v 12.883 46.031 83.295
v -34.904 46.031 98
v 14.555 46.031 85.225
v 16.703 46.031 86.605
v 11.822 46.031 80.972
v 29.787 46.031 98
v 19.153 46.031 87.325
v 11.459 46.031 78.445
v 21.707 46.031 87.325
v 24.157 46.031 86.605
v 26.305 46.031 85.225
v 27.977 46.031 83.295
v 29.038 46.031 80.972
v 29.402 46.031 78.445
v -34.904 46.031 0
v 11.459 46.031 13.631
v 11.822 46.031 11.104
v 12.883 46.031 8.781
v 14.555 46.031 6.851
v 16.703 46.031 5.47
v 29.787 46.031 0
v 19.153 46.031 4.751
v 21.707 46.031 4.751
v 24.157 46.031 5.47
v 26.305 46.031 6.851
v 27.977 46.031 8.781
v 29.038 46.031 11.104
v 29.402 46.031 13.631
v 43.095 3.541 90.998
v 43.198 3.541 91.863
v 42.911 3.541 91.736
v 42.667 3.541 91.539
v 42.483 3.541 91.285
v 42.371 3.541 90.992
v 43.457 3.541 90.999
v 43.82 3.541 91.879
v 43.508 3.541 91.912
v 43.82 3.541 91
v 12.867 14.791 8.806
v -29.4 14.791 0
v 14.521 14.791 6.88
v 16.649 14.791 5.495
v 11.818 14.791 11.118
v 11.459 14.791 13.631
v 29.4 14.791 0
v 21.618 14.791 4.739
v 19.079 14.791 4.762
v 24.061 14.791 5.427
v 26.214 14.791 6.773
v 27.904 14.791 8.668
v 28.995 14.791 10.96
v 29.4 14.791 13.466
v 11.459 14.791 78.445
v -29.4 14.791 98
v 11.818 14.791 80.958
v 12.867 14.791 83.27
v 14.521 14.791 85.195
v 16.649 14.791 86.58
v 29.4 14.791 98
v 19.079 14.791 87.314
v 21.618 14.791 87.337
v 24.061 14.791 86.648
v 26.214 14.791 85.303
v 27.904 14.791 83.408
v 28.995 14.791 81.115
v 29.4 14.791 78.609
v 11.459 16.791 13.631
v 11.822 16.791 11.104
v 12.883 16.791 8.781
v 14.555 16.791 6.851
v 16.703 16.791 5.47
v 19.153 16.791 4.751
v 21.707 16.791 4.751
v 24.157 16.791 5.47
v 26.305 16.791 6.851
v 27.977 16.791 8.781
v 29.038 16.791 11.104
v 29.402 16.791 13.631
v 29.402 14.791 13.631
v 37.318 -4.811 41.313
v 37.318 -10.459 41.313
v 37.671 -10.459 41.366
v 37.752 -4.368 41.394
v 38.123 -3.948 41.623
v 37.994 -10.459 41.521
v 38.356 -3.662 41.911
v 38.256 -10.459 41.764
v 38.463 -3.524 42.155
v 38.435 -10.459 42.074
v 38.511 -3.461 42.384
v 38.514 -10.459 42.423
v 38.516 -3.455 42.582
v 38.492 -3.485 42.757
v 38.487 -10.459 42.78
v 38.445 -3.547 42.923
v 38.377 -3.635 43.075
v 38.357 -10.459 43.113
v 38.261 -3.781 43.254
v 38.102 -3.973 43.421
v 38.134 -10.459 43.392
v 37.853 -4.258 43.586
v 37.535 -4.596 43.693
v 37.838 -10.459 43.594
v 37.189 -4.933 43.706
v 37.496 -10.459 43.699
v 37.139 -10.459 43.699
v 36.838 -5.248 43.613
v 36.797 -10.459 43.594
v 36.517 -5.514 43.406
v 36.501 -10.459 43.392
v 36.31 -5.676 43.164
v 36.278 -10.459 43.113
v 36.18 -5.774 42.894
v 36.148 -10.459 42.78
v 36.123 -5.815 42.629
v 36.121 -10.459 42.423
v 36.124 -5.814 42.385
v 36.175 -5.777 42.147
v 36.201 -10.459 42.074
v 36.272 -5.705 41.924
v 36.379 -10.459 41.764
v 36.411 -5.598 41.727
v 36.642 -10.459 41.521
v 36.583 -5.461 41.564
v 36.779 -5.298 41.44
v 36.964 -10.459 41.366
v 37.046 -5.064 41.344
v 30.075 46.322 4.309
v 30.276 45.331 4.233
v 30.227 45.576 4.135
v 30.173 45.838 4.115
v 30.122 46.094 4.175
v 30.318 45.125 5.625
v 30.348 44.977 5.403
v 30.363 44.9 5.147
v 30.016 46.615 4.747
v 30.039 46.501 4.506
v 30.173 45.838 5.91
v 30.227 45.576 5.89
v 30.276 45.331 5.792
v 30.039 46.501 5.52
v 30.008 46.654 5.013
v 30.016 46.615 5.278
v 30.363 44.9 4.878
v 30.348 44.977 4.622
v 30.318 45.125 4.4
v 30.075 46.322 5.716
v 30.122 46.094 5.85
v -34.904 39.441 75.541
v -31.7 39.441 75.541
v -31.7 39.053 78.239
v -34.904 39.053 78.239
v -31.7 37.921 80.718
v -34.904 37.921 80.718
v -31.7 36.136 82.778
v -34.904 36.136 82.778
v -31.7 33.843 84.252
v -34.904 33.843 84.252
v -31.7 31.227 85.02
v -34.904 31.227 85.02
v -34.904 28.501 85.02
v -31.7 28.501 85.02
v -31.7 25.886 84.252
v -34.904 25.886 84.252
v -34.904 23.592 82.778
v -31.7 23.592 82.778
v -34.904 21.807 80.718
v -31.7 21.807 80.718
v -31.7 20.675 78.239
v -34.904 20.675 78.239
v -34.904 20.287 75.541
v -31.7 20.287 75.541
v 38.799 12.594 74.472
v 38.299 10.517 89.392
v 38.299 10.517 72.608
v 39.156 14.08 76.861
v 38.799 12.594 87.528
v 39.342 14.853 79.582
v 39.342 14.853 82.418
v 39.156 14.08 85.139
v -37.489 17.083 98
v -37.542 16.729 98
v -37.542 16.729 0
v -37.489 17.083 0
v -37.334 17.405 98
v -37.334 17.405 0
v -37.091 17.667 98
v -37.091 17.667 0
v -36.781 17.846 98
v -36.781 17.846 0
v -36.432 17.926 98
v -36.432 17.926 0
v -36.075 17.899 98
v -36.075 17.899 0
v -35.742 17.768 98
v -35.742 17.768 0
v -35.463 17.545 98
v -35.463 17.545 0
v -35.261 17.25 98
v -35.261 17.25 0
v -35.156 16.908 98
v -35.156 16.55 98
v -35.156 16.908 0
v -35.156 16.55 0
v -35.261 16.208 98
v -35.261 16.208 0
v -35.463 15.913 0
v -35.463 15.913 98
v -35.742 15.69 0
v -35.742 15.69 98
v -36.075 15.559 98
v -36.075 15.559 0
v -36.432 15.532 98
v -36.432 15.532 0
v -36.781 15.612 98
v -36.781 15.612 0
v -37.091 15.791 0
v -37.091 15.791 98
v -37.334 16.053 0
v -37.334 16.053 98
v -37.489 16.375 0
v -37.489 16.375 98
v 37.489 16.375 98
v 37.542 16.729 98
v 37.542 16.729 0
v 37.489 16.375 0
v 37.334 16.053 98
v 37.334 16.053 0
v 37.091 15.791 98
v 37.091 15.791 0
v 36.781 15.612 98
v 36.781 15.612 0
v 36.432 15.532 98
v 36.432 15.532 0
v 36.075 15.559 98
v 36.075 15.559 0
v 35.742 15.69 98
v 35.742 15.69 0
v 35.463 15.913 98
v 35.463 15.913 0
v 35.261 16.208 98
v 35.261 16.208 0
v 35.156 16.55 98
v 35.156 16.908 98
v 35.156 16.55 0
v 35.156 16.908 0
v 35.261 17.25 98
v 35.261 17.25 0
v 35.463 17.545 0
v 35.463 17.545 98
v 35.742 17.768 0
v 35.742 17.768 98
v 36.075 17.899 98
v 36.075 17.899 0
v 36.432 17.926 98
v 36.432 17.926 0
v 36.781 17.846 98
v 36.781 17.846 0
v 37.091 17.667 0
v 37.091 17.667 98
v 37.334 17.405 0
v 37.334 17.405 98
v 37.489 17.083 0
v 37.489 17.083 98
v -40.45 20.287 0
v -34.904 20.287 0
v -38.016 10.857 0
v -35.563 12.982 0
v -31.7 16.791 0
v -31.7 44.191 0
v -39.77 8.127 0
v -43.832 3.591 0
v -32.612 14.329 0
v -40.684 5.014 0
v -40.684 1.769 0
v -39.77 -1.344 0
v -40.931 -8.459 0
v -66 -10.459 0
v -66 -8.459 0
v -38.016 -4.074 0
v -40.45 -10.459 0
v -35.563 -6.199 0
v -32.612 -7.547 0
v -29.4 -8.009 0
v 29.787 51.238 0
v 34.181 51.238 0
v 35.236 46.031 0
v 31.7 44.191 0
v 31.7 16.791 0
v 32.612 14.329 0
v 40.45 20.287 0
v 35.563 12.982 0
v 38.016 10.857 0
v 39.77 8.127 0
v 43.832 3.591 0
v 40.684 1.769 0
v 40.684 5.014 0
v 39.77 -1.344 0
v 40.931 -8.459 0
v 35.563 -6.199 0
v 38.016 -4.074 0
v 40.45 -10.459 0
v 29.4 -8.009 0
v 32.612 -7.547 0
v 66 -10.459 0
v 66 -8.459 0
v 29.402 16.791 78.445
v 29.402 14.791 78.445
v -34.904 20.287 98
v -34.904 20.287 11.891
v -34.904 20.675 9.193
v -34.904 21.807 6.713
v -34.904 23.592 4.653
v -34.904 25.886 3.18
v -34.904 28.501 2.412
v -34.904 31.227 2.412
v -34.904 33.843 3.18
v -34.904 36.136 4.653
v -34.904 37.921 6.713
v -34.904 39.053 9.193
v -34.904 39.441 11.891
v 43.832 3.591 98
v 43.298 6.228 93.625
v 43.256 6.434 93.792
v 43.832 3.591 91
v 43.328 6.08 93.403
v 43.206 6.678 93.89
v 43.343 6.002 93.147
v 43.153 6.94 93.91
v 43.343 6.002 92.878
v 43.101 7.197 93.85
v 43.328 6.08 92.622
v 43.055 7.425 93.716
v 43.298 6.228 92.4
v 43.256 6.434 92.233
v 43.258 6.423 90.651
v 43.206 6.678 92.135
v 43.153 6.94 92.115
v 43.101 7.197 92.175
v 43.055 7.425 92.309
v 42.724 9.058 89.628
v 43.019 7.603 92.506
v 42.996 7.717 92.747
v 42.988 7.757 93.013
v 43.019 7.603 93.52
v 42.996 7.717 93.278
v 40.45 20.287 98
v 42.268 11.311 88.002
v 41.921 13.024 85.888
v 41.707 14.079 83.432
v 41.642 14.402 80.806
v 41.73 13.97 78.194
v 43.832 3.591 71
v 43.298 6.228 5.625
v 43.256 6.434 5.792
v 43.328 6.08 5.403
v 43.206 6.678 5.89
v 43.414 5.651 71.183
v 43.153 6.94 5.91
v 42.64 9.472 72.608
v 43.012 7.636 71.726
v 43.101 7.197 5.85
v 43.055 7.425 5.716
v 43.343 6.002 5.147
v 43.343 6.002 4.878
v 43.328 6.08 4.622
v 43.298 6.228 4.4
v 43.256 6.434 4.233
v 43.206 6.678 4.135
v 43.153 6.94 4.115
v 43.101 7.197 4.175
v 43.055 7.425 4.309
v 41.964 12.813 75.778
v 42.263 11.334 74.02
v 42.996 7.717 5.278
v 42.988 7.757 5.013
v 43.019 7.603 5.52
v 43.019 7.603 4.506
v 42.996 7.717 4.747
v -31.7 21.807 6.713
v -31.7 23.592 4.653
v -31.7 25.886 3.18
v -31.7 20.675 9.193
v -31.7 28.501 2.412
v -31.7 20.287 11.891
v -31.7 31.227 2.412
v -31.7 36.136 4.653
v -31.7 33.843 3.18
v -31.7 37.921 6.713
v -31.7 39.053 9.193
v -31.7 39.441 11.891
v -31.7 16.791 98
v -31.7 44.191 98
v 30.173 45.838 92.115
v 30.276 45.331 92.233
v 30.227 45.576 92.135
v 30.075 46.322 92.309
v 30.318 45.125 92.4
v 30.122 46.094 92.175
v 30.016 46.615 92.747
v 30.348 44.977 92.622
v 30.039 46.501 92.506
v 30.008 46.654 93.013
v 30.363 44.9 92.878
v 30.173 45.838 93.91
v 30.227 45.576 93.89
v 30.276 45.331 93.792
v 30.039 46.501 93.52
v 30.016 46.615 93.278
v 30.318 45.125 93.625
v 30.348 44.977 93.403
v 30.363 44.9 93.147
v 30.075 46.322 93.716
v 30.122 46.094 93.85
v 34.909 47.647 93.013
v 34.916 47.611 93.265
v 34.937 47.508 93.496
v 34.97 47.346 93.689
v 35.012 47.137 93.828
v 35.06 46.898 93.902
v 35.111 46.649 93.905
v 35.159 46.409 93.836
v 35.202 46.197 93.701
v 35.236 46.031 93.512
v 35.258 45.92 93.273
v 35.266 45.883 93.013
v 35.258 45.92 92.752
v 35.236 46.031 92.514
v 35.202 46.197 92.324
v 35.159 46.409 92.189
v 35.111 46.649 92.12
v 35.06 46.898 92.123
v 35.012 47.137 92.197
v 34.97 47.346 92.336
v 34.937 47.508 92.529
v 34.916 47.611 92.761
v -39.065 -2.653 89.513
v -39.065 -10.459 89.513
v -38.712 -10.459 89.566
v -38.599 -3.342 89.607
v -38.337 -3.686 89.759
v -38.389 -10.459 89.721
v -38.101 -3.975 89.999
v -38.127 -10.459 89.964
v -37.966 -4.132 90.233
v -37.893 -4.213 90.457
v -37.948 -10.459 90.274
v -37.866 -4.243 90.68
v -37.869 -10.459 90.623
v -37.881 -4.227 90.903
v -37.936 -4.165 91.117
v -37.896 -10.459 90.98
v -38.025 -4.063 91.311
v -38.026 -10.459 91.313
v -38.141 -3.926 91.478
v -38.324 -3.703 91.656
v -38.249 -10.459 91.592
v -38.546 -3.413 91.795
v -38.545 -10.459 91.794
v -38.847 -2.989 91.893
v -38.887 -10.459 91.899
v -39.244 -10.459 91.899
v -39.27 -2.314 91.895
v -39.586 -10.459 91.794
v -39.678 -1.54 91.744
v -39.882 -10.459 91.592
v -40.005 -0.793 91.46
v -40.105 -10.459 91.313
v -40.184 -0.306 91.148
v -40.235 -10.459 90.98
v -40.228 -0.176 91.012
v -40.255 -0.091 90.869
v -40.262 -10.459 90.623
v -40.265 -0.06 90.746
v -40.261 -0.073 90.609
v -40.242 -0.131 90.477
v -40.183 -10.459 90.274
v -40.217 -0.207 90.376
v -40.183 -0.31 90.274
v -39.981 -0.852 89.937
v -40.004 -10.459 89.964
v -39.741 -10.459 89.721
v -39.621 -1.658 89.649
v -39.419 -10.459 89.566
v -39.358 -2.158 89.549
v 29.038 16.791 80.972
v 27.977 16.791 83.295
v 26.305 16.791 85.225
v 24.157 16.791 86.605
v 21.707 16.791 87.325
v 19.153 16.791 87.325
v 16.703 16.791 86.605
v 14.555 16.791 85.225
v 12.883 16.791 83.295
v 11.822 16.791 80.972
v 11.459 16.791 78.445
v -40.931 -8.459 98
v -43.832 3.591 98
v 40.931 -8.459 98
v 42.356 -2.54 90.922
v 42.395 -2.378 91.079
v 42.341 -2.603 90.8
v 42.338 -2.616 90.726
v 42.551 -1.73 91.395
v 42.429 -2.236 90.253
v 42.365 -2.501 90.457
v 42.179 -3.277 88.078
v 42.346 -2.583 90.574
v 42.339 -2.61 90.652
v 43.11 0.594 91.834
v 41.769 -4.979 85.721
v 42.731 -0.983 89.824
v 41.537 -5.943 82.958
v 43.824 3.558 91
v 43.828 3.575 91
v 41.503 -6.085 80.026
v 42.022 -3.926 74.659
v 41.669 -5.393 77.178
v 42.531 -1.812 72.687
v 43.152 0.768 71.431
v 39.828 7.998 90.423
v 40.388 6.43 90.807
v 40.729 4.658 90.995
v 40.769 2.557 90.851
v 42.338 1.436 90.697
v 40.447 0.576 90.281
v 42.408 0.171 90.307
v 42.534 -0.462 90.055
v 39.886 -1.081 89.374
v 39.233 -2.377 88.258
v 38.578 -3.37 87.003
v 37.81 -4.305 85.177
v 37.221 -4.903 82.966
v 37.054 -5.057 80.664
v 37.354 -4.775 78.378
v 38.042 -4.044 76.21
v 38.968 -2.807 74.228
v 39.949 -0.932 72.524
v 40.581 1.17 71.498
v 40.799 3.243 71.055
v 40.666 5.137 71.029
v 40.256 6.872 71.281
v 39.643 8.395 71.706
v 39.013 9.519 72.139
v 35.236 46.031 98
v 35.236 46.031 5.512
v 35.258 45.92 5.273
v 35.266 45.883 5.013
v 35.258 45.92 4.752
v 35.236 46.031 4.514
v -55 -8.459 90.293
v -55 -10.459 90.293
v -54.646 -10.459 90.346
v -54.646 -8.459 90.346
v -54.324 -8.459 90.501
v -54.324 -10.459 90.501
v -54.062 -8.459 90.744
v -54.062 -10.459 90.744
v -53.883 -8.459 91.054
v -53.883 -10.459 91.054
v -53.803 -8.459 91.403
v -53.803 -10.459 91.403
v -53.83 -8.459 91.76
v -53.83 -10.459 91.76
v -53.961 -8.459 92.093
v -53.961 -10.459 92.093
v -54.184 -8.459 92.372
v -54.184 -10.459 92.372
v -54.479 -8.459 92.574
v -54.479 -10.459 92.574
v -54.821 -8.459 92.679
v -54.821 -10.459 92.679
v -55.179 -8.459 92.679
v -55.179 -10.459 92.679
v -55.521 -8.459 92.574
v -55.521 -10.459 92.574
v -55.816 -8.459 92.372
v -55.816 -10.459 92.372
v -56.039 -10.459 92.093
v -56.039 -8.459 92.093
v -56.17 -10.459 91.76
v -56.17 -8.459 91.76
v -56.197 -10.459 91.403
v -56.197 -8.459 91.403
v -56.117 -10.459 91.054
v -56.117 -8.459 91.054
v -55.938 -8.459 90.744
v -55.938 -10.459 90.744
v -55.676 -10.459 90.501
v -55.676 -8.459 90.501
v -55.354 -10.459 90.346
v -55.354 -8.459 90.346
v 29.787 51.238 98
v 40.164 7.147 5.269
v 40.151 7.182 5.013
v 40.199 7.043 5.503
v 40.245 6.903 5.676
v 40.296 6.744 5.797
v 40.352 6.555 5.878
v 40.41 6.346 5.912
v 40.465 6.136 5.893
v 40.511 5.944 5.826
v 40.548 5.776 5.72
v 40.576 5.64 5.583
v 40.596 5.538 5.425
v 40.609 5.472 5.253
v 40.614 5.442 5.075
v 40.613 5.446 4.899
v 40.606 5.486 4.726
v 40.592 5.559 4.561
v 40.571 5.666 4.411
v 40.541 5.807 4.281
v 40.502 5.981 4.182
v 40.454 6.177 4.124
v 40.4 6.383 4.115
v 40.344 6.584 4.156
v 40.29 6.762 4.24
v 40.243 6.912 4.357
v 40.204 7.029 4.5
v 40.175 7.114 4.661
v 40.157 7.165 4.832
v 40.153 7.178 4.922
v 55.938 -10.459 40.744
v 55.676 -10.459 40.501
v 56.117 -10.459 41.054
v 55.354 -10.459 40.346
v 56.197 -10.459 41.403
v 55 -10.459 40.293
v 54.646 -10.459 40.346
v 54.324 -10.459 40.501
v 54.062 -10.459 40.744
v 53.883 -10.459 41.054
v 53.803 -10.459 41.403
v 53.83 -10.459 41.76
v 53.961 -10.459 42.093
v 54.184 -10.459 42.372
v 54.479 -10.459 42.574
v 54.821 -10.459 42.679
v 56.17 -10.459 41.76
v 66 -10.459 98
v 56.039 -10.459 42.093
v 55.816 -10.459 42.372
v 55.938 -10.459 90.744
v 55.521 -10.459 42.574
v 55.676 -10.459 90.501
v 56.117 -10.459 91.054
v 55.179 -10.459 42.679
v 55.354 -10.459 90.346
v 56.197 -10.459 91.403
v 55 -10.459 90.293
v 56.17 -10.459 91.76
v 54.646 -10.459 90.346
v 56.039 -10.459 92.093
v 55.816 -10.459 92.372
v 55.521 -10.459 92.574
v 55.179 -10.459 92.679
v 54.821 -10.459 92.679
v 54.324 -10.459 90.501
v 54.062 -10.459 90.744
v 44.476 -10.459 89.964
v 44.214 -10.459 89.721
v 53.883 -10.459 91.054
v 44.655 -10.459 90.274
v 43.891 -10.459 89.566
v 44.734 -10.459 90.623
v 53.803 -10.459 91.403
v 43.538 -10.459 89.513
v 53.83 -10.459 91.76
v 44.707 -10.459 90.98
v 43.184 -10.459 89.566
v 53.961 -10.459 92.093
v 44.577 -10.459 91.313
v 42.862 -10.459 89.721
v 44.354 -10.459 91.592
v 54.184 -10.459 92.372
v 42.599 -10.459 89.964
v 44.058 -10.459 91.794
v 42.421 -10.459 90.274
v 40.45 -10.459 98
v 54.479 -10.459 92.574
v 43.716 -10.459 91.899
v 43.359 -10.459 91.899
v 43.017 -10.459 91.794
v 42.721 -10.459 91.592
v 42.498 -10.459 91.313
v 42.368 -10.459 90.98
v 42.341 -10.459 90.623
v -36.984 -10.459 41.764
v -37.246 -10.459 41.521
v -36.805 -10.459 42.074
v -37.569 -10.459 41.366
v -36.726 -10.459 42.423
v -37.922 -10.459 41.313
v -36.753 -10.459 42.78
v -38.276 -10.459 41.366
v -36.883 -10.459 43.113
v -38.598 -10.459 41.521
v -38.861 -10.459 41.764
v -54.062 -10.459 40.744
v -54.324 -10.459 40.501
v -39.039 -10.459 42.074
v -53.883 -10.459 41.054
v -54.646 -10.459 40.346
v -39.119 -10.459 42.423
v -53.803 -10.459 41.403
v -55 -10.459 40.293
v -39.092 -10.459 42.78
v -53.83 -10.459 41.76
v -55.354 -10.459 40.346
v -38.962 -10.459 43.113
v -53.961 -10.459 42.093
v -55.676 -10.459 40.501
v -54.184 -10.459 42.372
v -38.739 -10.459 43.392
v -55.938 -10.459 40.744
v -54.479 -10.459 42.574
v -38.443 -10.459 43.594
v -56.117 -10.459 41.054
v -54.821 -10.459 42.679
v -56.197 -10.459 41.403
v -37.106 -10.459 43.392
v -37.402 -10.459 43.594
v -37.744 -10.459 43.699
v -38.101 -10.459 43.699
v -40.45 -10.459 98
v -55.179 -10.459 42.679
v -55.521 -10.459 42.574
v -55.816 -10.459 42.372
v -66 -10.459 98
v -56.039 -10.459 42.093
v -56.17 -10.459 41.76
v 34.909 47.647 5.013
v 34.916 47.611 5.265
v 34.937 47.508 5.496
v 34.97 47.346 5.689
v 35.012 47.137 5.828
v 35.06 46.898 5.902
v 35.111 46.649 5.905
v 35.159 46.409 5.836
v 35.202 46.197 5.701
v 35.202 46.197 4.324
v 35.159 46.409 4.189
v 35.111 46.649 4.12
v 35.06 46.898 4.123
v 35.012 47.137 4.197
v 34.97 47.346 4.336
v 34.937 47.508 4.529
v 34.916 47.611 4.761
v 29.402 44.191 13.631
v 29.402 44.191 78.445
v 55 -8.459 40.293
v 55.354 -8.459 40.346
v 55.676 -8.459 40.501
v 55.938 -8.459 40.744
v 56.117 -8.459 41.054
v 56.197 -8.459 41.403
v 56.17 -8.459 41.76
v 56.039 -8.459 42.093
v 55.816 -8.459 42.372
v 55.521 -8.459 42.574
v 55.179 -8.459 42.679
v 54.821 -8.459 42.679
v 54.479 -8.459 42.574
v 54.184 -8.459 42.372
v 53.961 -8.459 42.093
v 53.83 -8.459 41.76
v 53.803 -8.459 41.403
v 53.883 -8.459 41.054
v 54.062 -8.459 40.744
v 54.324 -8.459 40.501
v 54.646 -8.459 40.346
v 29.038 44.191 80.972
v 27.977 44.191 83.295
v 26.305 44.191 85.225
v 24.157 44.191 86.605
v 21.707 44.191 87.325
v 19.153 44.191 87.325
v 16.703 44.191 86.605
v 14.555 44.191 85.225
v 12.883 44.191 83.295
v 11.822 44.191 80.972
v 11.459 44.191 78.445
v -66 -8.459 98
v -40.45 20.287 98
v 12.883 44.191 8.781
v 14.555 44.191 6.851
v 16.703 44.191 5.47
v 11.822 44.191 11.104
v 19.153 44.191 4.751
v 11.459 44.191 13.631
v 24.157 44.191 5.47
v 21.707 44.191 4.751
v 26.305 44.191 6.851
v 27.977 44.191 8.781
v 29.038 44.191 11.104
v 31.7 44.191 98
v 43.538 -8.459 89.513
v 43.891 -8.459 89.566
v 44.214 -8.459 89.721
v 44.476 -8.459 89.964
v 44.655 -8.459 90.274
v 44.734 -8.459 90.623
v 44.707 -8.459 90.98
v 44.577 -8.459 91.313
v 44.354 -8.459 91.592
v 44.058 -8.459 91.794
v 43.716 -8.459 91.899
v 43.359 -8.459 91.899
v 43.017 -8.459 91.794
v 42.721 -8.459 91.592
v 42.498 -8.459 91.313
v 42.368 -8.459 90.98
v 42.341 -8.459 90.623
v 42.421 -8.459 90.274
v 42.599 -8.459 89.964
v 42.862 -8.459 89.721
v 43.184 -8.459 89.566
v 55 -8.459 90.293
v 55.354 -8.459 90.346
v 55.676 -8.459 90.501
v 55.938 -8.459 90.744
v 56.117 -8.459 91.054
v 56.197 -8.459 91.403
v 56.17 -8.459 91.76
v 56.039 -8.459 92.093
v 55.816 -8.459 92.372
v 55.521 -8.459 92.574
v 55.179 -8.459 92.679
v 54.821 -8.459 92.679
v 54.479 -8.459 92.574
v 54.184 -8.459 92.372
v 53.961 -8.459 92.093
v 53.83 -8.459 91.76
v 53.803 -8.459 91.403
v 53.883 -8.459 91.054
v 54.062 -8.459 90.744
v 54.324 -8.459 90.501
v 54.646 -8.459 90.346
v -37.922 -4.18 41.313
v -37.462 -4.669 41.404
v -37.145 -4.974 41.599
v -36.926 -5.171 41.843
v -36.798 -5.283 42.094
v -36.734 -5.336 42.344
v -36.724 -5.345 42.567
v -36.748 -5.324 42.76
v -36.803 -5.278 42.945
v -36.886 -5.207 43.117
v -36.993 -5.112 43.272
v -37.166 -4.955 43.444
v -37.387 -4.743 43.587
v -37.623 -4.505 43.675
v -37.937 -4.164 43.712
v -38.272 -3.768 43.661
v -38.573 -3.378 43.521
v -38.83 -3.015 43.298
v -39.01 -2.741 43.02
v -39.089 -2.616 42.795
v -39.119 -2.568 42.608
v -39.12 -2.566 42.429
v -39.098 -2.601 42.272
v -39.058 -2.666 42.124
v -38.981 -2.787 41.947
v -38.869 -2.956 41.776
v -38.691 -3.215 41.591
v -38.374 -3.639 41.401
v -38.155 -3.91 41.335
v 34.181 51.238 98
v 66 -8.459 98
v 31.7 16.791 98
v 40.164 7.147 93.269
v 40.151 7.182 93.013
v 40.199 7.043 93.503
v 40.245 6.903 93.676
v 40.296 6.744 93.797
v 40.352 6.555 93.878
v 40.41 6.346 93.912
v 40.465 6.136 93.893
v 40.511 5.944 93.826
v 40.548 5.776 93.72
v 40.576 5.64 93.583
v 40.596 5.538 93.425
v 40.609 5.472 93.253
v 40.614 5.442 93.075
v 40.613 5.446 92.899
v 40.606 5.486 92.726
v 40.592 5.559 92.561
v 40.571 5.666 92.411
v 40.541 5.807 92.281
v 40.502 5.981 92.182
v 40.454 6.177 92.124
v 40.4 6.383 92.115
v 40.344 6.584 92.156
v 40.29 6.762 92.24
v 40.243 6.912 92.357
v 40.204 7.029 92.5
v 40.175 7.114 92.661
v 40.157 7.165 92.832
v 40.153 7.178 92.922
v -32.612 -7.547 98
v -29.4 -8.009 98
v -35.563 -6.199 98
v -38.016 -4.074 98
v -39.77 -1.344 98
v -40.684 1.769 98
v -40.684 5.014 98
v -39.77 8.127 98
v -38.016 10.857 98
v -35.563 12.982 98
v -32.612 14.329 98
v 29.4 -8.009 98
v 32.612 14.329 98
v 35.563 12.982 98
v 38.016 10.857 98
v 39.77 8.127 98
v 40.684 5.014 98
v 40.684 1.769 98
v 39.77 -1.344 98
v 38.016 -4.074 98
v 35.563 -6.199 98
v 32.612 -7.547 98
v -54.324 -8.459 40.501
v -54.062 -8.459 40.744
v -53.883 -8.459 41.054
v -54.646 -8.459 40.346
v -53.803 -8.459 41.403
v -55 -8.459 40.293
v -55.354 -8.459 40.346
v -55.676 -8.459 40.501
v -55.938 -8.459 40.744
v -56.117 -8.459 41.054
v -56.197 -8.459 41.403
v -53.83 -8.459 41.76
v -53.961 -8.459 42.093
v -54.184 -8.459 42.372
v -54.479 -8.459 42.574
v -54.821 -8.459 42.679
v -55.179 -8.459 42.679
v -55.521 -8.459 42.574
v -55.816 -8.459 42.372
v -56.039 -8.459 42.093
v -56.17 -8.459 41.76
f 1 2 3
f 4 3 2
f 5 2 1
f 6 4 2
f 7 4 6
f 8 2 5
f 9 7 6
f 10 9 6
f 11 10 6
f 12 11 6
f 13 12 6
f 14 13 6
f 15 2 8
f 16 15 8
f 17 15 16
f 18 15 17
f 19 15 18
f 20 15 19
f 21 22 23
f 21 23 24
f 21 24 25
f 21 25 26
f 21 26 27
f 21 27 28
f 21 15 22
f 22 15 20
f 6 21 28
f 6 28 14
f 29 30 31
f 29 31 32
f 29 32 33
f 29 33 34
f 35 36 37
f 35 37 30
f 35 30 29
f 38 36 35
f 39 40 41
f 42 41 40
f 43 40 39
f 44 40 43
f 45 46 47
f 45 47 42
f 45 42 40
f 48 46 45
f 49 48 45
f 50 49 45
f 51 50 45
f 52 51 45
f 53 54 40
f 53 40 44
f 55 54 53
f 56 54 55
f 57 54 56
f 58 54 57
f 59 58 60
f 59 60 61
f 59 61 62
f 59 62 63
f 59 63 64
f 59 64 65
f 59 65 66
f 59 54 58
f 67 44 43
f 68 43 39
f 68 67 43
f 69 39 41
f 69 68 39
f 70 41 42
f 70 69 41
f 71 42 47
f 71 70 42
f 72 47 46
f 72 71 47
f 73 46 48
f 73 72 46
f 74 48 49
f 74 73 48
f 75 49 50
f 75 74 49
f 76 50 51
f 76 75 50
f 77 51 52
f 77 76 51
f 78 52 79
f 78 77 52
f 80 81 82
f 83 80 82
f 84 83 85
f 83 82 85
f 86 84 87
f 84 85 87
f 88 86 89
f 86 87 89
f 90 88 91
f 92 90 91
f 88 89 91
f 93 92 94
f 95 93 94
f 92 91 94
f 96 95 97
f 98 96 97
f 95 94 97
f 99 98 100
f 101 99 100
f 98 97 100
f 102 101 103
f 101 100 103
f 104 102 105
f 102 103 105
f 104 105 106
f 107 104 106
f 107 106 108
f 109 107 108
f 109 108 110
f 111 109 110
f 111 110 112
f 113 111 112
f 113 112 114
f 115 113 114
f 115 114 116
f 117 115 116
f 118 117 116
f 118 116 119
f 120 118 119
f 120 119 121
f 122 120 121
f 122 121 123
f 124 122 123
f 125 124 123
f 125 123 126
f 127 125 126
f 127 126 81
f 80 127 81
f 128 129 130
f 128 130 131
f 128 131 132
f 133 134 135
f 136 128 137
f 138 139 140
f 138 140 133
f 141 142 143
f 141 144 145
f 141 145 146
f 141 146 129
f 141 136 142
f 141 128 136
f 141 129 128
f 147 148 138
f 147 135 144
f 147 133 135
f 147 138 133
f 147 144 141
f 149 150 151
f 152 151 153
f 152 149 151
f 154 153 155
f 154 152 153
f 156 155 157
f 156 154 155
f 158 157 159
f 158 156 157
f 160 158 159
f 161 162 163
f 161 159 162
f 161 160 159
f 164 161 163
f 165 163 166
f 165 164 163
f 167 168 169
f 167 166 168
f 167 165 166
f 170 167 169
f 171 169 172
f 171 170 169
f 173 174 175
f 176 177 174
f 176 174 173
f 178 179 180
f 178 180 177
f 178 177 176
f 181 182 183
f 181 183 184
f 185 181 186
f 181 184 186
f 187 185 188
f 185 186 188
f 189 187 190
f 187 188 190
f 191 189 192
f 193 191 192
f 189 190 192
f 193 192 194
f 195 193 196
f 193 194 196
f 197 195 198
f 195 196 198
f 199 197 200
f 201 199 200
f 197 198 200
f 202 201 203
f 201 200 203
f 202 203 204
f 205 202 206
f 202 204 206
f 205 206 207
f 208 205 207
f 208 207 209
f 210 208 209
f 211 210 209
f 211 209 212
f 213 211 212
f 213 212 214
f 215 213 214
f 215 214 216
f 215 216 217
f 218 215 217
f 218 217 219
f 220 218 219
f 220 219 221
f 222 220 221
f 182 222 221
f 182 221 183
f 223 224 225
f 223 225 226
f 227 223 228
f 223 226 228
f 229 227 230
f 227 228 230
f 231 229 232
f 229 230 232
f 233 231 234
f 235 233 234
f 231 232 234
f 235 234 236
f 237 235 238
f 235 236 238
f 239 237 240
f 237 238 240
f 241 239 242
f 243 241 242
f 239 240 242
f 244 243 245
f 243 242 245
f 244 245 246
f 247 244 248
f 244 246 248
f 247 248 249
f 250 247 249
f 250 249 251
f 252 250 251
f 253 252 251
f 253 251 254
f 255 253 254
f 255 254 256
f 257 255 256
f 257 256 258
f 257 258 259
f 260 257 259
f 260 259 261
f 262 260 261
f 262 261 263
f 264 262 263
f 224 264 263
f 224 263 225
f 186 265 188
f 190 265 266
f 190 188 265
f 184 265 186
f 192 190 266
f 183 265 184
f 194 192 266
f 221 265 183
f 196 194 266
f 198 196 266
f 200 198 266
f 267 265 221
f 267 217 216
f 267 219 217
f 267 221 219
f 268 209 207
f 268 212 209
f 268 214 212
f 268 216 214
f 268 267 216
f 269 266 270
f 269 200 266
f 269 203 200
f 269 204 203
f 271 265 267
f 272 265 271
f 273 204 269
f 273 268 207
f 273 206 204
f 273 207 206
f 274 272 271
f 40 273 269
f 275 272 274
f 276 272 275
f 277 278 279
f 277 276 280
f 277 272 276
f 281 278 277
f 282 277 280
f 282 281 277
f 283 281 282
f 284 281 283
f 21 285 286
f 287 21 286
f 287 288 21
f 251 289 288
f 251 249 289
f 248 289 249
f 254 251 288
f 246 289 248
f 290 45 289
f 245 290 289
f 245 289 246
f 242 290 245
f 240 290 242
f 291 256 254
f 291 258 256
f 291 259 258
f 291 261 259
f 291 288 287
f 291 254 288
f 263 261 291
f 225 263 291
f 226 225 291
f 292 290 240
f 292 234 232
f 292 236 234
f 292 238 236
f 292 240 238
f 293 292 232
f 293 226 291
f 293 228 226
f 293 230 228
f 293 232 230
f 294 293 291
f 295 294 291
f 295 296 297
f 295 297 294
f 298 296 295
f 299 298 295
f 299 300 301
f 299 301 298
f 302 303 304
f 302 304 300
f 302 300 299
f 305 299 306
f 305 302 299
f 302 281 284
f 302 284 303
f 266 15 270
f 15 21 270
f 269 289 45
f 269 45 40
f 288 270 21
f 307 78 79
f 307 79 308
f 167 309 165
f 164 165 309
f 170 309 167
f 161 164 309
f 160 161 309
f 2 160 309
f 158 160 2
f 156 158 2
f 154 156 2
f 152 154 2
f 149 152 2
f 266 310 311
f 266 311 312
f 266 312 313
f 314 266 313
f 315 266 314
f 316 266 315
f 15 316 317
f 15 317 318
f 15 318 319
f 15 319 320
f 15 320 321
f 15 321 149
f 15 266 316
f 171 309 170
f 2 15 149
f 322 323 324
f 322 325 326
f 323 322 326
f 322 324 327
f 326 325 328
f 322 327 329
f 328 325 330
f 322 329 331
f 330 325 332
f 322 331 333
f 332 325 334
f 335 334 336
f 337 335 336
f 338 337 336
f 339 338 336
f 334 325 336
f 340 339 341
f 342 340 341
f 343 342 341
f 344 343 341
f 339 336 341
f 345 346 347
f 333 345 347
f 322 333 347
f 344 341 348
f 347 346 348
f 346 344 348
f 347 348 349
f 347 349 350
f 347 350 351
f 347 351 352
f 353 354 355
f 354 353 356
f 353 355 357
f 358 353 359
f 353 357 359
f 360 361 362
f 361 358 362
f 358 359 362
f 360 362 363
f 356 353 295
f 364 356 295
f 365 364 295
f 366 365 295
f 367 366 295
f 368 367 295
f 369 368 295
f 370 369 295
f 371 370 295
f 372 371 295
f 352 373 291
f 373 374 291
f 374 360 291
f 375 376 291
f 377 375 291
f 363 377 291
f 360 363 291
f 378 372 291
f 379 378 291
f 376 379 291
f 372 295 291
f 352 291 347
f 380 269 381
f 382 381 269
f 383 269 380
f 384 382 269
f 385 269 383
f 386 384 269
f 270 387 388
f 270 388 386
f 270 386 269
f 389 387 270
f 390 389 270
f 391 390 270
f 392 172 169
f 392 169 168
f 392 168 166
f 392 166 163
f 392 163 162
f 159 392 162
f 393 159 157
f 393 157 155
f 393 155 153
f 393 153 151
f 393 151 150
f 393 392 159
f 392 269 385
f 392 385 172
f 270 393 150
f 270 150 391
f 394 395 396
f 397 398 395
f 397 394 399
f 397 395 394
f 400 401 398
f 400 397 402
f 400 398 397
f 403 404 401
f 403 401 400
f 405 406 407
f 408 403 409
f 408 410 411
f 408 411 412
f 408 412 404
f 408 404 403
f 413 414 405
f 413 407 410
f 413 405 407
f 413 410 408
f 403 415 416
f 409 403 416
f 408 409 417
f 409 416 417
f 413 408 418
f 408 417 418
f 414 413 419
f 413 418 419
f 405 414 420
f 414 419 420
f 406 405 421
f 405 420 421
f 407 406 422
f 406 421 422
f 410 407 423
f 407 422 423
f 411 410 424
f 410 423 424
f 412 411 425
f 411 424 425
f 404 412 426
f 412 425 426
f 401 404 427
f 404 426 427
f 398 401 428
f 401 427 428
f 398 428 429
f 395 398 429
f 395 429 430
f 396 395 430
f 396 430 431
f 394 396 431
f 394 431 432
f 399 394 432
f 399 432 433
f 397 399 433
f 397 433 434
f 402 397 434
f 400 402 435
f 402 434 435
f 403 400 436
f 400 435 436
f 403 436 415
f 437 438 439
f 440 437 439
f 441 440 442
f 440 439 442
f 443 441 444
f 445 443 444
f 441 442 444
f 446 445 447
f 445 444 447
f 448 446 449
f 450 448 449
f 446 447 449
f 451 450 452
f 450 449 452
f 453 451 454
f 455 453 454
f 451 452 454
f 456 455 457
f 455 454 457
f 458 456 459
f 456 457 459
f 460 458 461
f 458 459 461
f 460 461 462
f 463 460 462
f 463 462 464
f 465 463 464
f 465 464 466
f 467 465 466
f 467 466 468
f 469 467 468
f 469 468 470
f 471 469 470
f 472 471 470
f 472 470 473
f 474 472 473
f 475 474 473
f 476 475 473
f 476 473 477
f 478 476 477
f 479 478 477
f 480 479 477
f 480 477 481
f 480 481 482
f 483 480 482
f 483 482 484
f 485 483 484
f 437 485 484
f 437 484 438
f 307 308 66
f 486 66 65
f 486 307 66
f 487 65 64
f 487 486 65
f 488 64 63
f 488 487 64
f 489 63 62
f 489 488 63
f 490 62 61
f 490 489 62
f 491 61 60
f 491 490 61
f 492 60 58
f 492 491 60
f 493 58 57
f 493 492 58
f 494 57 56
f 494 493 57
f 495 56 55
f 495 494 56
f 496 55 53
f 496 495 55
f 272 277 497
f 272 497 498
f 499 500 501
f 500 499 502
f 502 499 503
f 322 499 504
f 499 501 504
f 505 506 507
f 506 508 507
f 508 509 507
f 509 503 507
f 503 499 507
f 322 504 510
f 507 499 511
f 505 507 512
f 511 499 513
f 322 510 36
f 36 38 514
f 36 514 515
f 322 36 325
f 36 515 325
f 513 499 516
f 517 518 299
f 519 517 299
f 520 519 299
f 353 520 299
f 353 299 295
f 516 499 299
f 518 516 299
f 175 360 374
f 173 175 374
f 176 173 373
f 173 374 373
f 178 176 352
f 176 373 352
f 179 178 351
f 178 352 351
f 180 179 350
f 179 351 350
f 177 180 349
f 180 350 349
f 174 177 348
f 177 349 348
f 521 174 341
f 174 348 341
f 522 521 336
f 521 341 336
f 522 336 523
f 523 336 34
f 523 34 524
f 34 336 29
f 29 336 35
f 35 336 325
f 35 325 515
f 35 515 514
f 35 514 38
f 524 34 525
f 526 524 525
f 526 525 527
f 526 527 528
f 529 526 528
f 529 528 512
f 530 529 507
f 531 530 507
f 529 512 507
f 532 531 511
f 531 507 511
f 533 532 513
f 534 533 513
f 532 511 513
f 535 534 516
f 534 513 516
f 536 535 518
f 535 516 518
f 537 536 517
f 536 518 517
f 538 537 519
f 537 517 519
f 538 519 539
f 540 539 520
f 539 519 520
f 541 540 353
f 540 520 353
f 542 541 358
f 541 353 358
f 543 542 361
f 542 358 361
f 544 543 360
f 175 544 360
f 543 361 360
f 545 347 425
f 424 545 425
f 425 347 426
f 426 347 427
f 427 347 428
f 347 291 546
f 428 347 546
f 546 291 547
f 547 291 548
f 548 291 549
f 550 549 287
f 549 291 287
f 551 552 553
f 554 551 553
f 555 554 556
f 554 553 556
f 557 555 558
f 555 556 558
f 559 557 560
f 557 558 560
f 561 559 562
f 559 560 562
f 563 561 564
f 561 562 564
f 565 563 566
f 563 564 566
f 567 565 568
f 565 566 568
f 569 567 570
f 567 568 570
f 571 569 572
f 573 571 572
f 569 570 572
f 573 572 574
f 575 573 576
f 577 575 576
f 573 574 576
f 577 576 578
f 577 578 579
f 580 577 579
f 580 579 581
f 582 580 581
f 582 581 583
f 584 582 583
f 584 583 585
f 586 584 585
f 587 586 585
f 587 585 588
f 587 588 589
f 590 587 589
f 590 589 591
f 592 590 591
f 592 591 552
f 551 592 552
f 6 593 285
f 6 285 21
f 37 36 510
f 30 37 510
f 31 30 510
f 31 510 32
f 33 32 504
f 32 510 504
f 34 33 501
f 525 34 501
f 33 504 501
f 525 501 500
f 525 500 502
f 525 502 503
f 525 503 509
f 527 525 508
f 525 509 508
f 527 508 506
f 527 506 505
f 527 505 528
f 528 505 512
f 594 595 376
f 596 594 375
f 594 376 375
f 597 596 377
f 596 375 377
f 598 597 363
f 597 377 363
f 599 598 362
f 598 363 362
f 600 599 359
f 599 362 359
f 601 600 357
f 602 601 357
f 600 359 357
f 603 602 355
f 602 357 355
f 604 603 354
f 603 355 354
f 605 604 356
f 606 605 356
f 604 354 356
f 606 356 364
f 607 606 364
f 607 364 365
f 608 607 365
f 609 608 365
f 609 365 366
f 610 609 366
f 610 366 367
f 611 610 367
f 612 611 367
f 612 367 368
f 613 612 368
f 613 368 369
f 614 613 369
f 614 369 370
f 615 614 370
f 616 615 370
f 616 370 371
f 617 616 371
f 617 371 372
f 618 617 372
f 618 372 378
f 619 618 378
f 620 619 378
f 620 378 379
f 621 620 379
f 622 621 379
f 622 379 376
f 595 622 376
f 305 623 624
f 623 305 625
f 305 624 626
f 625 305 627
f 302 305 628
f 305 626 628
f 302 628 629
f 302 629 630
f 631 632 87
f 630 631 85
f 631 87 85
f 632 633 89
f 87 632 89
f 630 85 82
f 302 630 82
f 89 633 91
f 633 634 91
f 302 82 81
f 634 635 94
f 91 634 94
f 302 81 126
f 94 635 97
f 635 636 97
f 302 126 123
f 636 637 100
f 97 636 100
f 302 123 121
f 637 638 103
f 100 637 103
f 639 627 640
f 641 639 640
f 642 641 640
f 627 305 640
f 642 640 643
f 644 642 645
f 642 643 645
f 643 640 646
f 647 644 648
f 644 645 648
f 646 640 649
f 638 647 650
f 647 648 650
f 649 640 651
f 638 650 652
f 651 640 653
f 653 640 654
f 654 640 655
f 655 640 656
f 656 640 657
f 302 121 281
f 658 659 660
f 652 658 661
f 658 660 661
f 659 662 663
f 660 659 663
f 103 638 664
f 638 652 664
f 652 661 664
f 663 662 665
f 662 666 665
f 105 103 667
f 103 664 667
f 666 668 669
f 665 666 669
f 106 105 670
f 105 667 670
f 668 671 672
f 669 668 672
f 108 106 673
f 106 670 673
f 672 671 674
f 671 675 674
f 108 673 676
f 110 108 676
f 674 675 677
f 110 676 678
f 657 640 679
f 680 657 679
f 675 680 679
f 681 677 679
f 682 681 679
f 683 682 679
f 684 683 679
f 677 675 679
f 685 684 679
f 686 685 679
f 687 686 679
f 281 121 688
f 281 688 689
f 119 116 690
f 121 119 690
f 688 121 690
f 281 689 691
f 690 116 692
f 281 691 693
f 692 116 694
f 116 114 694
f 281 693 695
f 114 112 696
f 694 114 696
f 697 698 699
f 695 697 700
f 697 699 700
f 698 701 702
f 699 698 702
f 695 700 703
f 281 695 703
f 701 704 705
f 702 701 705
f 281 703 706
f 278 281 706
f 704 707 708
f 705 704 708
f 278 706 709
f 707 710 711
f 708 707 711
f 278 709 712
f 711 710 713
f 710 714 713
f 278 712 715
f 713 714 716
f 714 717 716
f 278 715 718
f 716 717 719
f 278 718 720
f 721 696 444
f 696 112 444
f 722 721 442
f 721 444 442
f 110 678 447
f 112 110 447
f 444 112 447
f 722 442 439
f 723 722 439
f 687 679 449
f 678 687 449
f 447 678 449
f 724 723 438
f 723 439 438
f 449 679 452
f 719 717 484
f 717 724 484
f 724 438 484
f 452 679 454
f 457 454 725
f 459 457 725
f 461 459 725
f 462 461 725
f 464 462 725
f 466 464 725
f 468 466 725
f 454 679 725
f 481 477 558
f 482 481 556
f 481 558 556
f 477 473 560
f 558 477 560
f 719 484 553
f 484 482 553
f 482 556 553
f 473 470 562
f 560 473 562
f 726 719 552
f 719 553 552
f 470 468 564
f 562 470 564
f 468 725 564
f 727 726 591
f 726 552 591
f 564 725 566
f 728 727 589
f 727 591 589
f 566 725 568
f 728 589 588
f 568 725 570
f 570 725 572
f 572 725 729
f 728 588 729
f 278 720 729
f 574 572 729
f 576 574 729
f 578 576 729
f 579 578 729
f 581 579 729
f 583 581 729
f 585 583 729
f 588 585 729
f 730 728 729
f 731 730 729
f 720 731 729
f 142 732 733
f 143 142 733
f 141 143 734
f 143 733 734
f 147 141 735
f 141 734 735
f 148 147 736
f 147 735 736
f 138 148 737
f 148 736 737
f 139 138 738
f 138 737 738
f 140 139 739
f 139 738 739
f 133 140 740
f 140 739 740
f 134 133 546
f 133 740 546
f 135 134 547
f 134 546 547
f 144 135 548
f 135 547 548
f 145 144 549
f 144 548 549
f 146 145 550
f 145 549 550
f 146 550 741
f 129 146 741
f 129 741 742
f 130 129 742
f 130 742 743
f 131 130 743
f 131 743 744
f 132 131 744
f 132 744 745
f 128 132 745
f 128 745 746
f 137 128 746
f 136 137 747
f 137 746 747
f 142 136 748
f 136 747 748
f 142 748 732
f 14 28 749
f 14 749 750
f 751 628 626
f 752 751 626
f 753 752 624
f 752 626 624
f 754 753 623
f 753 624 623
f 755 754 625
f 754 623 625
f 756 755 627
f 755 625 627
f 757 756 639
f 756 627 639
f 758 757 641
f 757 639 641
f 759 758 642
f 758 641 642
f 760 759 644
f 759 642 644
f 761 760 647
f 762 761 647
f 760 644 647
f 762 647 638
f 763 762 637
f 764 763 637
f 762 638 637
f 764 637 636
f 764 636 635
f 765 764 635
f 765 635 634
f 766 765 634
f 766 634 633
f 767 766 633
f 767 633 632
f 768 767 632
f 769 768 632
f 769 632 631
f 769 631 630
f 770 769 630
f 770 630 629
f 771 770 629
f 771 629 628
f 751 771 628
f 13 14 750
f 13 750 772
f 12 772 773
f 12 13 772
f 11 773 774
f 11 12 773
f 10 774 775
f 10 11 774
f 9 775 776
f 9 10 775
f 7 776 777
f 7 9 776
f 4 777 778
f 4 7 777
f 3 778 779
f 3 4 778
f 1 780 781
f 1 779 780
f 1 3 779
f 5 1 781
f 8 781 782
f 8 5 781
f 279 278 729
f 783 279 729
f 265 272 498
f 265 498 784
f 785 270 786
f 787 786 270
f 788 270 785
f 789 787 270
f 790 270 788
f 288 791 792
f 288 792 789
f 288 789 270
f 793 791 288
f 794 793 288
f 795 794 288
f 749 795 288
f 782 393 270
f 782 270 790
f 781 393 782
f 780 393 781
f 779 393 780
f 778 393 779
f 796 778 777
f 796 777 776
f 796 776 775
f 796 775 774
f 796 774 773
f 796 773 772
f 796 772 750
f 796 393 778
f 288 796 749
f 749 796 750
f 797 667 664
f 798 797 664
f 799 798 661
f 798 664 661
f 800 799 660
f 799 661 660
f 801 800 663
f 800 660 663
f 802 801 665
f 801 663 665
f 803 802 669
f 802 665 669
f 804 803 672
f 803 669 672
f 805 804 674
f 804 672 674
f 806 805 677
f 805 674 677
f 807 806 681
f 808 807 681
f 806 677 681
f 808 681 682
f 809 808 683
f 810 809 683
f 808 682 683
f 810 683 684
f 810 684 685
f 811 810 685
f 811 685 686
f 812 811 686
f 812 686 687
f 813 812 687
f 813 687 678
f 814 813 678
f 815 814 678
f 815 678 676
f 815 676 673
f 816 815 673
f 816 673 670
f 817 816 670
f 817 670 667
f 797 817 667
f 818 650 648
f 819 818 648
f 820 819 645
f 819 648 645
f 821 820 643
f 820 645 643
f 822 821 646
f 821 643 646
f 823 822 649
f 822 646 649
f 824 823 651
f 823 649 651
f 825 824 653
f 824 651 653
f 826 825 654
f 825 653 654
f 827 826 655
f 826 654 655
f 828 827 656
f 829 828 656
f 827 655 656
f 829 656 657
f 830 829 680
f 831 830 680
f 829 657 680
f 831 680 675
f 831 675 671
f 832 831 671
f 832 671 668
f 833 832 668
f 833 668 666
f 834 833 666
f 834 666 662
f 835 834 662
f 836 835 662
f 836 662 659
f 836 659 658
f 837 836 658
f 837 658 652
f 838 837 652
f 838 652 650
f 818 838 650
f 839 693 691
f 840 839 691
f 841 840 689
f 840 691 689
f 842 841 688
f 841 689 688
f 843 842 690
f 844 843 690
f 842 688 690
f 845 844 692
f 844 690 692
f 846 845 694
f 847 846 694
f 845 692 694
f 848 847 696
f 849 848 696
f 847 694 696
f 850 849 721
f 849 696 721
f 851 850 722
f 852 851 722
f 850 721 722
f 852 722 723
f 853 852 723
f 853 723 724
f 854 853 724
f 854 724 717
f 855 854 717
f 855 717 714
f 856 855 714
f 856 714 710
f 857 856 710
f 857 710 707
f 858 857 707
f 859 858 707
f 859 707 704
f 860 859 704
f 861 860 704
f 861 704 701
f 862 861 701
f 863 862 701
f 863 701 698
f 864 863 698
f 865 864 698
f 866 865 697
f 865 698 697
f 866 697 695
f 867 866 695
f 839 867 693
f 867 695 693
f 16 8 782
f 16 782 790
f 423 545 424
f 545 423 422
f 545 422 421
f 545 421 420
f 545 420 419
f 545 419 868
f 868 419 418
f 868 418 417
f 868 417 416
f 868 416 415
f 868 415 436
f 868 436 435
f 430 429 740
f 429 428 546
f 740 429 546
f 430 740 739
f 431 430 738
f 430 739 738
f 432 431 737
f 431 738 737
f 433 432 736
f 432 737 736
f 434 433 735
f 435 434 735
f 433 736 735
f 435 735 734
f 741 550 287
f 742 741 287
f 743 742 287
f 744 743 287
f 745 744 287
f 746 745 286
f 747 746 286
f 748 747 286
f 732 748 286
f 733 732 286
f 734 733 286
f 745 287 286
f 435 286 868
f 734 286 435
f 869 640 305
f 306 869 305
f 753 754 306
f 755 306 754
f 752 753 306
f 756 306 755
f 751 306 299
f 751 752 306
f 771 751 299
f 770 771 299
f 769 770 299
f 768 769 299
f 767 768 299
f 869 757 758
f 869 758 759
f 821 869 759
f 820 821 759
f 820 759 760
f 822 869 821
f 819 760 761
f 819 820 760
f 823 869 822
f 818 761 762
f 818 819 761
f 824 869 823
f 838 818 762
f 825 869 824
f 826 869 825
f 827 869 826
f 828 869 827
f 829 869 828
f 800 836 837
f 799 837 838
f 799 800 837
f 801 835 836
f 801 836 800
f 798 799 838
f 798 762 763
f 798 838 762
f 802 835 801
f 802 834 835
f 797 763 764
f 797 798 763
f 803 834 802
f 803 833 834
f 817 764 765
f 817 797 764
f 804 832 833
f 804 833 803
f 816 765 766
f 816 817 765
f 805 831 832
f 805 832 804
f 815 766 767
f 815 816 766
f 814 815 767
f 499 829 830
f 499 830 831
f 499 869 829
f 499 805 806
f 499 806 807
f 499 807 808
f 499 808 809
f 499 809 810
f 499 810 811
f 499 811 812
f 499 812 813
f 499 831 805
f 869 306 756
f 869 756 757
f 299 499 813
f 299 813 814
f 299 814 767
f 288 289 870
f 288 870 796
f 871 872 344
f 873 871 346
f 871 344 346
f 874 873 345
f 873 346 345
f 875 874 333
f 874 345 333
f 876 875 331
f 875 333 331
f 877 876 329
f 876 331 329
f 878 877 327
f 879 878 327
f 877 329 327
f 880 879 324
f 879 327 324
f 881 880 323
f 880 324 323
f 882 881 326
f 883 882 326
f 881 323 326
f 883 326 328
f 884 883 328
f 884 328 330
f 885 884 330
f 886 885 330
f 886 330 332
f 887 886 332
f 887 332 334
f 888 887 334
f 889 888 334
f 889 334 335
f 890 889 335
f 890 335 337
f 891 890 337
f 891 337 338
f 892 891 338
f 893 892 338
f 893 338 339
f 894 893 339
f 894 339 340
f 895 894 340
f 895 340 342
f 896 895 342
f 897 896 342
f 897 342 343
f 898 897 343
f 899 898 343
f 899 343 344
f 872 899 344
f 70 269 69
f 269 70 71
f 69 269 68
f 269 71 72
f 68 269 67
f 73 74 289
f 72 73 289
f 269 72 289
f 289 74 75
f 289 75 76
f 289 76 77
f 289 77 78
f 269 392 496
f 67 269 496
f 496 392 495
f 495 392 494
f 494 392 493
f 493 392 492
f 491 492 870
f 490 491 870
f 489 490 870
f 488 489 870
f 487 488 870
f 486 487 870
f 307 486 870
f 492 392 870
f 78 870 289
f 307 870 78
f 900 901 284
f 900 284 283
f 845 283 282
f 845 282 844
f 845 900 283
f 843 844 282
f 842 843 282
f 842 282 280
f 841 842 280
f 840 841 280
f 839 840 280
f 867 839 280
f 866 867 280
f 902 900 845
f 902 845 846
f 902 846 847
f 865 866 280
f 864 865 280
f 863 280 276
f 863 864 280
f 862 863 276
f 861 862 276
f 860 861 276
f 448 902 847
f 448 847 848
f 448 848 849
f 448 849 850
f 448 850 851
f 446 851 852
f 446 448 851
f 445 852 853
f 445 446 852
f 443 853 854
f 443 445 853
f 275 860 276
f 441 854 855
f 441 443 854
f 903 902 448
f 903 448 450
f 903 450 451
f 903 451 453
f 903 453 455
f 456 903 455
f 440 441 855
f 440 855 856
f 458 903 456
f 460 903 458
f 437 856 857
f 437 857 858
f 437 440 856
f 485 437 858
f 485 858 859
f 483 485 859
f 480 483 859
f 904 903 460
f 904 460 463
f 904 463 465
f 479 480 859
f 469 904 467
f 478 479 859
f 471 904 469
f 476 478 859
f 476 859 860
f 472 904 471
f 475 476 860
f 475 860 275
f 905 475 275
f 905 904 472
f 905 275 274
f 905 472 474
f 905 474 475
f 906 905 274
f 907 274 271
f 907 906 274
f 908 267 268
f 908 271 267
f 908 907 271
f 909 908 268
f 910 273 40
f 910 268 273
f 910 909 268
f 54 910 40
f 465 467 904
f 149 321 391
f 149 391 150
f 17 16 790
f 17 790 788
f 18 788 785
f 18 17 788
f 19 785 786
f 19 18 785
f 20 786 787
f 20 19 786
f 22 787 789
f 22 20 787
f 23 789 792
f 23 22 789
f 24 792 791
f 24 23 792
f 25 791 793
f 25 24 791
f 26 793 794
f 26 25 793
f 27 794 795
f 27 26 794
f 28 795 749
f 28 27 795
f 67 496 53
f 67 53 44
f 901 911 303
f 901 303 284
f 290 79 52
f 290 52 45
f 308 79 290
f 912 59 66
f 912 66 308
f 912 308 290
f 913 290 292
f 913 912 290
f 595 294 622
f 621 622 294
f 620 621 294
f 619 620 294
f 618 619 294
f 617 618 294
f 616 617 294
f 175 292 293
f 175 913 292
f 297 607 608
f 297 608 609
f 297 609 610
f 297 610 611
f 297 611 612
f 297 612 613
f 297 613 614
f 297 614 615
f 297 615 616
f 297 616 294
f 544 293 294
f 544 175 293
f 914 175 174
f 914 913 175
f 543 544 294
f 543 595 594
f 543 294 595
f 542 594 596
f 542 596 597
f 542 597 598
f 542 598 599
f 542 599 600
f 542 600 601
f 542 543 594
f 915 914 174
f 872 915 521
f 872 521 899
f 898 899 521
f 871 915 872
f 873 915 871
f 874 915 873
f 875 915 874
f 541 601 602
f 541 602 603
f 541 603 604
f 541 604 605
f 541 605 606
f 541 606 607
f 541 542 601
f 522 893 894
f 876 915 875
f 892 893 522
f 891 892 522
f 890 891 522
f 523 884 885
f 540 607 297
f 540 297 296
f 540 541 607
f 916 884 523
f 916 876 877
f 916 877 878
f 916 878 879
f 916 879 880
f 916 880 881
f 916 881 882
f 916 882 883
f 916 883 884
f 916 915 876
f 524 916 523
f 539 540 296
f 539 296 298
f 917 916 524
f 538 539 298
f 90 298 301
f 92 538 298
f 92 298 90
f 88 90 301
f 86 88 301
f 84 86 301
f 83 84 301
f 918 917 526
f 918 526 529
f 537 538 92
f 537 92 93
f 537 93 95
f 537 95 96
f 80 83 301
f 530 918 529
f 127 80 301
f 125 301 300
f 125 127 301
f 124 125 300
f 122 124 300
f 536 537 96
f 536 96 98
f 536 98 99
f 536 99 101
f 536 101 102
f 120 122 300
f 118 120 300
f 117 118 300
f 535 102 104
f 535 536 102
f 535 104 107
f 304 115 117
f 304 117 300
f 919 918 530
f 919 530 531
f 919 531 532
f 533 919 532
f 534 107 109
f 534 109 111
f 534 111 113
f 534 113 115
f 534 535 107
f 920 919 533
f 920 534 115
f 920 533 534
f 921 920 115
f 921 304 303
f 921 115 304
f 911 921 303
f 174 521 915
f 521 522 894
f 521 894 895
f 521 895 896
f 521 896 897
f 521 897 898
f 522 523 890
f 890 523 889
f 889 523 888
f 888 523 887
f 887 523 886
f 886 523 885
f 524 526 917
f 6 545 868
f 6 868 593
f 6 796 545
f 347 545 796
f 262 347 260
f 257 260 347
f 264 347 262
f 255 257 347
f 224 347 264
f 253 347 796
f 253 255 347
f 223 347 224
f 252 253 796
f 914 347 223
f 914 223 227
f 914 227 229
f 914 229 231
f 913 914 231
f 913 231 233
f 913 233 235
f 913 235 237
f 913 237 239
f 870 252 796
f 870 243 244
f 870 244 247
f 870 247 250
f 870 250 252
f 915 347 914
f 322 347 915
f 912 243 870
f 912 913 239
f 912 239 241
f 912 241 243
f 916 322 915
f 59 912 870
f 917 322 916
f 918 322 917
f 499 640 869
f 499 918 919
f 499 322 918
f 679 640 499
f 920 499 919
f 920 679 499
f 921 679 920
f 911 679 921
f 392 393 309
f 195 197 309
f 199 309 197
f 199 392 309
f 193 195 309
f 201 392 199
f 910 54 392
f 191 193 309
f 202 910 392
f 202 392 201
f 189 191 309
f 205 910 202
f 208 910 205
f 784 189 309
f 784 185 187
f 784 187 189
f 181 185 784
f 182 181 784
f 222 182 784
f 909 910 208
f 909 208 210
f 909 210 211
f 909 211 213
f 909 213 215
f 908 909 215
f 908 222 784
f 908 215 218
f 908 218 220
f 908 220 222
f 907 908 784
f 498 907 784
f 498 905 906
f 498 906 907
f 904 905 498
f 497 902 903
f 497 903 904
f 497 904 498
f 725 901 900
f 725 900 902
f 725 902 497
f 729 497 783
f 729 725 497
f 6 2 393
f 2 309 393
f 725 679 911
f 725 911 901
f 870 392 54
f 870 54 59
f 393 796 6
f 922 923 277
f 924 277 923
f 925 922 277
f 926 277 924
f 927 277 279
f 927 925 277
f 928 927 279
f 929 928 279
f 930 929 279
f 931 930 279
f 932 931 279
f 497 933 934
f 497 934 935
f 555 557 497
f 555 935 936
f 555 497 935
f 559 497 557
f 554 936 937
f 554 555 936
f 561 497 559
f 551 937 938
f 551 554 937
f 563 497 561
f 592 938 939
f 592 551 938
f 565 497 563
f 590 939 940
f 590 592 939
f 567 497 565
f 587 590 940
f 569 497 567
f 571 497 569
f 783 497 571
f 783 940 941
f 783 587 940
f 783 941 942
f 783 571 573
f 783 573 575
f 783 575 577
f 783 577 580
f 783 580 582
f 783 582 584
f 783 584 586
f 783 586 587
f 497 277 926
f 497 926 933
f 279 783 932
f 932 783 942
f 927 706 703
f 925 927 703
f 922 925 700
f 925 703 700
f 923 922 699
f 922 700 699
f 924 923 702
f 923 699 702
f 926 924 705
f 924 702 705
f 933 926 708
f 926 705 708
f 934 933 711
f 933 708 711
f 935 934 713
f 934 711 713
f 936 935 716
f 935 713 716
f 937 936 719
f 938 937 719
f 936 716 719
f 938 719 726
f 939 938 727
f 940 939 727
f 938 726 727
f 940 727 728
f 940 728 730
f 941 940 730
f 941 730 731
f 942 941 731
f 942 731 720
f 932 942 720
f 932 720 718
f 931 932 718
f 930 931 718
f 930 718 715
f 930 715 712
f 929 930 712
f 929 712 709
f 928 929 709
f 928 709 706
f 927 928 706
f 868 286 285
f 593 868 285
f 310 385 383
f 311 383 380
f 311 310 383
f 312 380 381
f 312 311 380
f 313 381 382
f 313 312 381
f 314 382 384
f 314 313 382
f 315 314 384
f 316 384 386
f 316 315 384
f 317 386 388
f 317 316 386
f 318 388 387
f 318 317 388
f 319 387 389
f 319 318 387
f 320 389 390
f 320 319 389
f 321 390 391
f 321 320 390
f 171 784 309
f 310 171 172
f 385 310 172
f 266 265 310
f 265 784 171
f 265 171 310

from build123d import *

# Parameters (mm, degrees)
ESQUISSE1_W              = 112.172532808
ESQUISSE1_H              = 92.061088164
BOSS_EXTRU_1_DEPTH       = 98
ESQUISSE2_W              = 63.4
ESQUISSE2_H              = 27.4
ENL_V_MAT_EXTRU_1_DEPTH  = 122.93637795
ENL_V_MAT_EXTRU_2_DEPTH  = 122.93637795
ESQUISSE8_R              = 1.2
ENL_V_MAT_EXTRU_5_DEPTH  = 122.93637795
ENL_V_MAT_EXTRU_10_DEPTH = 36
BOSS_EXTRU_2_DEPTH       = 98
ESQUISSE15_R             = 0.9
ENL_V_MAT_EXTRU_11_DEPTH = 5
ENL_V_MAT_EXTRU_13_DEPTH = 33
ESQUISSE18_R             = 10
ENL_V_MAT_EXTRU_14_DEPTH = 7
ESQUISSE19_W             = 80.9
ESQUISSE19_H             = 35.571792003
ENL_V_MAT_EXTRU_15_DEPTH = 119.955890106
BOSS_EXTRU_3_DEPTH       = 2
ESQUISSE22_R             = 1.2
ENL_V_MAT_EXTRU_16_DEPTH = 14


with BuildPart() as part:
    # Esquisse1 → Boss.-Extru.1 (new body)
    with BuildSketch(Plane.XY):
        Rectangle(ESQUISSE1_W, ESQUISSE1_H)
    extrude(amount=BOSS_EXTRU_1_DEPTH)

    # Esquisse2 → Enlèv. mat.-Extru.1 (cut, through all)
    with BuildSketch(Plane.XY.offset(98)):
        with Locations((0, 30.491247921)):
            Rectangle(ESQUISSE2_W, ESQUISSE2_H)
    extrude(amount=-ENL_V_MAT_EXTRU_1_DEPTH, mode=Mode.SUBTRACT)

    # Esquisse3 → Enlèv. mat.-Extru.2 (cut, through all)
    with BuildSketch(Plane.XY.offset(98)):
        with BuildLine():
            Line((-29.4, 14.791247921), (29.4, 14.791247921))
            ThreePointArc((29.4, 14.791247921), (40.8, 3.391247921), (29.4, -8.008752079))
            Line((29.4, -8.008752079), (-29.4, -8.008752079))
            ThreePointArc((-29.4, -8.008752079), (-40.8, 3.391247921), (-29.4, 14.791247921))
        make_face()
    extrude(amount=-ENL_V_MAT_EXTRU_2_DEPTH, mode=Mode.SUBTRACT)

    # Esquisse8 → Enlèv. mat.-Extru.5 (cut, through all)
    with BuildSketch(Plane(origin=(0, 0, 0), x_dir=(-1, 0, 0), z_dir=(0, 0, -1))):
        with Locations((36.342435472, 16.729092577)):
            Circle(ESQUISSE8_R)
        with Locations(Location((-36.342435472, 16.729092577, 0), (0, 0, 180))):
            Circle(ESQUISSE8_R)
        Polygon((40.45, -46.030544082), (40.45, -10.458752079), (43.831541667, 3.591247921), (40.45, 20.287049631), (34.90419829, 20.287049631), (34.90419829, 46.030544082), (56.086266404, 46.030544082), (56.086266404, -46.030544082), align=None)
        Polygon((-40.45, -46.030544082), (-40.45, -10.458752079), (-43.831541667, 3.591247921), (-40.45, 20.287049631), (-35.235952742, 46.030544082), (-56.086266404, 46.030544082), (-56.086266404, -46.030544082), align=None)
    extrude(amount=-ENL_V_MAT_EXTRU_5_DEPTH, mode=Mode.SUBTRACT)

    # Esquisse13 → Enlèv. mat.-Extru.10 (cut)
    with BuildSketch(Plane(origin=(0, 46.030544082, 0), x_dir=(1, 0, 0), z_dir=(0, 1, 0))):
        with BuildLine():
            Line((29.401511347, -13.631097944), (29.401511347, -78.444504203))
            ThreePointArc((29.401511347, -78.444504203), (20.430009822, -87.416005728), (11.458508297, -78.444504203))
            Line((11.458508297, -78.444504203), (11.458508297, -13.631097944))
            ThreePointArc((11.458508297, -13.631097944), (20.430009822, -4.659596419), (29.401511347, -13.631097944))
        make_face()
    extrude(amount=-ENL_V_MAT_EXTRU_10_DEPTH, mode=Mode.SUBTRACT)

    # Esquisse14 → Boss.-Extru.2 (add, through all)
    with BuildSketch(Plane(origin=(0, 0, 0), x_dir=(-1, 0, 0), z_dir=(0, 0, -1))):
        Polygon((-35.235952742, 46.030544082), (-34.181307811, 51.237678691), (-29.786849485, 51.237678691), (-29.786849485, 46.030544082), align=None)
    extrude(amount=-BOSS_EXTRU_2_DEPTH)

    # Esquisse15 → Enlèv. mat.-Extru.11 (cut)
    with BuildSketch(Plane(origin=(42.803048455, 8.669262748, 0), x_dir=(0, 0, -1), z_dir=(0.980099310455717, 0.19850778736419453, 0))):
        with Locations(Location((-5.012556966, -1.831122741, 0), (0, 0, 90))):
            Circle(ESQUISSE15_R)
        with Locations(Location((-5.012556966, 38.868877259, 0), (0, 0, 90))):
            Circle(ESQUISSE15_R)
        with Locations(Location((-93.012556966, -1.831122741, 0), (0, 0, 90))):
            Circle(ESQUISSE15_R)
        with Locations(Location((-93.012556966, 38.868877259, 0), (0, 0, 90))):
            Circle(ESQUISSE15_R)
    extrude(amount=-ENL_V_MAT_EXTRU_11_DEPTH, mode=Mode.SUBTRACT)

    # Esquisse17 → Enlèv. mat.-Extru.13 (cut)
    with BuildSketch(Plane.ZY.offset(34.90419829)):
        with BuildLine():
            Line((11.891222977, 39.441182616), (75.540539517, 39.441182616))
            ThreePointArc((75.540539517, 39.441182616), (85.11760601, 29.864116124), (75.540539517, 20.287049631))
            Line((75.540539517, 20.287049631), (11.891222977, 20.287049631))
            ThreePointArc((11.891222977, 20.287049631), (2.314156484, 29.864116124), (11.891222977, 39.441182616))
        make_face()
    extrude(amount=-ENL_V_MAT_EXTRU_13_DEPTH, mode=Mode.SUBTRACT)

    # Esquisse18 → Enlèv. mat.-Extru.14 (cut)
    with BuildSketch(Plane(origin=(40.614547147, -9.775073555, 0), x_dir=(0, 0, -1), z_dir=(0.9722372677043548, -0.23399721213461214, 0))):
        with Locations(Location((-81, 13.74800362, 0), (0, 0, 32.947816907))):
            Circle(ESQUISSE18_R)
    extrude(amount=-ENL_V_MAT_EXTRU_14_DEPTH, mode=Mode.SUBTRACT)

    # Esquisse19 → Enlèv. mat.-Extru.15 (cut, through all)
    with BuildSketch(Plane(origin=(0, 0, 0), x_dir=(-1, 0, 0), z_dir=(0, 0, -1))):
        with Locations((0, -28.244648081)):
            Rectangle(ESQUISSE19_W, ESQUISSE19_H)
    extrude(amount=-ENL_V_MAT_EXTRU_15_DEPTH, mode=Mode.SUBTRACT)

    # Esquisse21 → Boss.-Extru.3 (add)
    with BuildSketch(Plane.XZ.offset(10.458752079)):
        Polygon((-40.45, 98), (40.45, 98), (66, 98), (66, 0), (40.45, 0), (-40.45, 0), (-66, 0), (-66, 98), align=None)
    extrude(amount=-BOSS_EXTRU_3_DEPTH)

    # Esquisse22 → Enlèv. mat.-Extru.16 (cut)
    with BuildSketch(Plane.XZ.offset(10.458752079)):
        with Locations(Location((43.537561985, 90.712580413, 0), (0, 0, 270))):
            Circle(ESQUISSE22_R)
        with Locations(Location((55, 91.492580413, 0), (0, 0, 270))):
            Circle(ESQUISSE22_R)
        with Locations(Location((37.317561985, 42.512580413, 0), (0, 0, 270))):
            Circle(ESQUISSE22_R)
        with Locations(Location((55, 41.492580413, 0), (0, 0, 270))):
            Circle(ESQUISSE22_R)
        with Locations(Location((-55, 41.492580413, 0), (0, 0, 270))):
            Circle(ESQUISSE22_R)
        with Locations(Location((-37.922438015, 42.512580413, 0), (0, 0, 270))):
            Circle(ESQUISSE22_R)
        with Locations(Location((-55, 91.492580413, 0), (0, 0, 270))):
            Circle(ESQUISSE22_R)
        with Locations(Location((-39.065455989, 90.712580413, 0), (0, 0, 270))):
            Circle(ESQUISSE22_R)
    extrude(amount=-ENL_V_MAT_EXTRU_16_DEPTH, mode=Mode.SUBTRACT)


solid = part.part
